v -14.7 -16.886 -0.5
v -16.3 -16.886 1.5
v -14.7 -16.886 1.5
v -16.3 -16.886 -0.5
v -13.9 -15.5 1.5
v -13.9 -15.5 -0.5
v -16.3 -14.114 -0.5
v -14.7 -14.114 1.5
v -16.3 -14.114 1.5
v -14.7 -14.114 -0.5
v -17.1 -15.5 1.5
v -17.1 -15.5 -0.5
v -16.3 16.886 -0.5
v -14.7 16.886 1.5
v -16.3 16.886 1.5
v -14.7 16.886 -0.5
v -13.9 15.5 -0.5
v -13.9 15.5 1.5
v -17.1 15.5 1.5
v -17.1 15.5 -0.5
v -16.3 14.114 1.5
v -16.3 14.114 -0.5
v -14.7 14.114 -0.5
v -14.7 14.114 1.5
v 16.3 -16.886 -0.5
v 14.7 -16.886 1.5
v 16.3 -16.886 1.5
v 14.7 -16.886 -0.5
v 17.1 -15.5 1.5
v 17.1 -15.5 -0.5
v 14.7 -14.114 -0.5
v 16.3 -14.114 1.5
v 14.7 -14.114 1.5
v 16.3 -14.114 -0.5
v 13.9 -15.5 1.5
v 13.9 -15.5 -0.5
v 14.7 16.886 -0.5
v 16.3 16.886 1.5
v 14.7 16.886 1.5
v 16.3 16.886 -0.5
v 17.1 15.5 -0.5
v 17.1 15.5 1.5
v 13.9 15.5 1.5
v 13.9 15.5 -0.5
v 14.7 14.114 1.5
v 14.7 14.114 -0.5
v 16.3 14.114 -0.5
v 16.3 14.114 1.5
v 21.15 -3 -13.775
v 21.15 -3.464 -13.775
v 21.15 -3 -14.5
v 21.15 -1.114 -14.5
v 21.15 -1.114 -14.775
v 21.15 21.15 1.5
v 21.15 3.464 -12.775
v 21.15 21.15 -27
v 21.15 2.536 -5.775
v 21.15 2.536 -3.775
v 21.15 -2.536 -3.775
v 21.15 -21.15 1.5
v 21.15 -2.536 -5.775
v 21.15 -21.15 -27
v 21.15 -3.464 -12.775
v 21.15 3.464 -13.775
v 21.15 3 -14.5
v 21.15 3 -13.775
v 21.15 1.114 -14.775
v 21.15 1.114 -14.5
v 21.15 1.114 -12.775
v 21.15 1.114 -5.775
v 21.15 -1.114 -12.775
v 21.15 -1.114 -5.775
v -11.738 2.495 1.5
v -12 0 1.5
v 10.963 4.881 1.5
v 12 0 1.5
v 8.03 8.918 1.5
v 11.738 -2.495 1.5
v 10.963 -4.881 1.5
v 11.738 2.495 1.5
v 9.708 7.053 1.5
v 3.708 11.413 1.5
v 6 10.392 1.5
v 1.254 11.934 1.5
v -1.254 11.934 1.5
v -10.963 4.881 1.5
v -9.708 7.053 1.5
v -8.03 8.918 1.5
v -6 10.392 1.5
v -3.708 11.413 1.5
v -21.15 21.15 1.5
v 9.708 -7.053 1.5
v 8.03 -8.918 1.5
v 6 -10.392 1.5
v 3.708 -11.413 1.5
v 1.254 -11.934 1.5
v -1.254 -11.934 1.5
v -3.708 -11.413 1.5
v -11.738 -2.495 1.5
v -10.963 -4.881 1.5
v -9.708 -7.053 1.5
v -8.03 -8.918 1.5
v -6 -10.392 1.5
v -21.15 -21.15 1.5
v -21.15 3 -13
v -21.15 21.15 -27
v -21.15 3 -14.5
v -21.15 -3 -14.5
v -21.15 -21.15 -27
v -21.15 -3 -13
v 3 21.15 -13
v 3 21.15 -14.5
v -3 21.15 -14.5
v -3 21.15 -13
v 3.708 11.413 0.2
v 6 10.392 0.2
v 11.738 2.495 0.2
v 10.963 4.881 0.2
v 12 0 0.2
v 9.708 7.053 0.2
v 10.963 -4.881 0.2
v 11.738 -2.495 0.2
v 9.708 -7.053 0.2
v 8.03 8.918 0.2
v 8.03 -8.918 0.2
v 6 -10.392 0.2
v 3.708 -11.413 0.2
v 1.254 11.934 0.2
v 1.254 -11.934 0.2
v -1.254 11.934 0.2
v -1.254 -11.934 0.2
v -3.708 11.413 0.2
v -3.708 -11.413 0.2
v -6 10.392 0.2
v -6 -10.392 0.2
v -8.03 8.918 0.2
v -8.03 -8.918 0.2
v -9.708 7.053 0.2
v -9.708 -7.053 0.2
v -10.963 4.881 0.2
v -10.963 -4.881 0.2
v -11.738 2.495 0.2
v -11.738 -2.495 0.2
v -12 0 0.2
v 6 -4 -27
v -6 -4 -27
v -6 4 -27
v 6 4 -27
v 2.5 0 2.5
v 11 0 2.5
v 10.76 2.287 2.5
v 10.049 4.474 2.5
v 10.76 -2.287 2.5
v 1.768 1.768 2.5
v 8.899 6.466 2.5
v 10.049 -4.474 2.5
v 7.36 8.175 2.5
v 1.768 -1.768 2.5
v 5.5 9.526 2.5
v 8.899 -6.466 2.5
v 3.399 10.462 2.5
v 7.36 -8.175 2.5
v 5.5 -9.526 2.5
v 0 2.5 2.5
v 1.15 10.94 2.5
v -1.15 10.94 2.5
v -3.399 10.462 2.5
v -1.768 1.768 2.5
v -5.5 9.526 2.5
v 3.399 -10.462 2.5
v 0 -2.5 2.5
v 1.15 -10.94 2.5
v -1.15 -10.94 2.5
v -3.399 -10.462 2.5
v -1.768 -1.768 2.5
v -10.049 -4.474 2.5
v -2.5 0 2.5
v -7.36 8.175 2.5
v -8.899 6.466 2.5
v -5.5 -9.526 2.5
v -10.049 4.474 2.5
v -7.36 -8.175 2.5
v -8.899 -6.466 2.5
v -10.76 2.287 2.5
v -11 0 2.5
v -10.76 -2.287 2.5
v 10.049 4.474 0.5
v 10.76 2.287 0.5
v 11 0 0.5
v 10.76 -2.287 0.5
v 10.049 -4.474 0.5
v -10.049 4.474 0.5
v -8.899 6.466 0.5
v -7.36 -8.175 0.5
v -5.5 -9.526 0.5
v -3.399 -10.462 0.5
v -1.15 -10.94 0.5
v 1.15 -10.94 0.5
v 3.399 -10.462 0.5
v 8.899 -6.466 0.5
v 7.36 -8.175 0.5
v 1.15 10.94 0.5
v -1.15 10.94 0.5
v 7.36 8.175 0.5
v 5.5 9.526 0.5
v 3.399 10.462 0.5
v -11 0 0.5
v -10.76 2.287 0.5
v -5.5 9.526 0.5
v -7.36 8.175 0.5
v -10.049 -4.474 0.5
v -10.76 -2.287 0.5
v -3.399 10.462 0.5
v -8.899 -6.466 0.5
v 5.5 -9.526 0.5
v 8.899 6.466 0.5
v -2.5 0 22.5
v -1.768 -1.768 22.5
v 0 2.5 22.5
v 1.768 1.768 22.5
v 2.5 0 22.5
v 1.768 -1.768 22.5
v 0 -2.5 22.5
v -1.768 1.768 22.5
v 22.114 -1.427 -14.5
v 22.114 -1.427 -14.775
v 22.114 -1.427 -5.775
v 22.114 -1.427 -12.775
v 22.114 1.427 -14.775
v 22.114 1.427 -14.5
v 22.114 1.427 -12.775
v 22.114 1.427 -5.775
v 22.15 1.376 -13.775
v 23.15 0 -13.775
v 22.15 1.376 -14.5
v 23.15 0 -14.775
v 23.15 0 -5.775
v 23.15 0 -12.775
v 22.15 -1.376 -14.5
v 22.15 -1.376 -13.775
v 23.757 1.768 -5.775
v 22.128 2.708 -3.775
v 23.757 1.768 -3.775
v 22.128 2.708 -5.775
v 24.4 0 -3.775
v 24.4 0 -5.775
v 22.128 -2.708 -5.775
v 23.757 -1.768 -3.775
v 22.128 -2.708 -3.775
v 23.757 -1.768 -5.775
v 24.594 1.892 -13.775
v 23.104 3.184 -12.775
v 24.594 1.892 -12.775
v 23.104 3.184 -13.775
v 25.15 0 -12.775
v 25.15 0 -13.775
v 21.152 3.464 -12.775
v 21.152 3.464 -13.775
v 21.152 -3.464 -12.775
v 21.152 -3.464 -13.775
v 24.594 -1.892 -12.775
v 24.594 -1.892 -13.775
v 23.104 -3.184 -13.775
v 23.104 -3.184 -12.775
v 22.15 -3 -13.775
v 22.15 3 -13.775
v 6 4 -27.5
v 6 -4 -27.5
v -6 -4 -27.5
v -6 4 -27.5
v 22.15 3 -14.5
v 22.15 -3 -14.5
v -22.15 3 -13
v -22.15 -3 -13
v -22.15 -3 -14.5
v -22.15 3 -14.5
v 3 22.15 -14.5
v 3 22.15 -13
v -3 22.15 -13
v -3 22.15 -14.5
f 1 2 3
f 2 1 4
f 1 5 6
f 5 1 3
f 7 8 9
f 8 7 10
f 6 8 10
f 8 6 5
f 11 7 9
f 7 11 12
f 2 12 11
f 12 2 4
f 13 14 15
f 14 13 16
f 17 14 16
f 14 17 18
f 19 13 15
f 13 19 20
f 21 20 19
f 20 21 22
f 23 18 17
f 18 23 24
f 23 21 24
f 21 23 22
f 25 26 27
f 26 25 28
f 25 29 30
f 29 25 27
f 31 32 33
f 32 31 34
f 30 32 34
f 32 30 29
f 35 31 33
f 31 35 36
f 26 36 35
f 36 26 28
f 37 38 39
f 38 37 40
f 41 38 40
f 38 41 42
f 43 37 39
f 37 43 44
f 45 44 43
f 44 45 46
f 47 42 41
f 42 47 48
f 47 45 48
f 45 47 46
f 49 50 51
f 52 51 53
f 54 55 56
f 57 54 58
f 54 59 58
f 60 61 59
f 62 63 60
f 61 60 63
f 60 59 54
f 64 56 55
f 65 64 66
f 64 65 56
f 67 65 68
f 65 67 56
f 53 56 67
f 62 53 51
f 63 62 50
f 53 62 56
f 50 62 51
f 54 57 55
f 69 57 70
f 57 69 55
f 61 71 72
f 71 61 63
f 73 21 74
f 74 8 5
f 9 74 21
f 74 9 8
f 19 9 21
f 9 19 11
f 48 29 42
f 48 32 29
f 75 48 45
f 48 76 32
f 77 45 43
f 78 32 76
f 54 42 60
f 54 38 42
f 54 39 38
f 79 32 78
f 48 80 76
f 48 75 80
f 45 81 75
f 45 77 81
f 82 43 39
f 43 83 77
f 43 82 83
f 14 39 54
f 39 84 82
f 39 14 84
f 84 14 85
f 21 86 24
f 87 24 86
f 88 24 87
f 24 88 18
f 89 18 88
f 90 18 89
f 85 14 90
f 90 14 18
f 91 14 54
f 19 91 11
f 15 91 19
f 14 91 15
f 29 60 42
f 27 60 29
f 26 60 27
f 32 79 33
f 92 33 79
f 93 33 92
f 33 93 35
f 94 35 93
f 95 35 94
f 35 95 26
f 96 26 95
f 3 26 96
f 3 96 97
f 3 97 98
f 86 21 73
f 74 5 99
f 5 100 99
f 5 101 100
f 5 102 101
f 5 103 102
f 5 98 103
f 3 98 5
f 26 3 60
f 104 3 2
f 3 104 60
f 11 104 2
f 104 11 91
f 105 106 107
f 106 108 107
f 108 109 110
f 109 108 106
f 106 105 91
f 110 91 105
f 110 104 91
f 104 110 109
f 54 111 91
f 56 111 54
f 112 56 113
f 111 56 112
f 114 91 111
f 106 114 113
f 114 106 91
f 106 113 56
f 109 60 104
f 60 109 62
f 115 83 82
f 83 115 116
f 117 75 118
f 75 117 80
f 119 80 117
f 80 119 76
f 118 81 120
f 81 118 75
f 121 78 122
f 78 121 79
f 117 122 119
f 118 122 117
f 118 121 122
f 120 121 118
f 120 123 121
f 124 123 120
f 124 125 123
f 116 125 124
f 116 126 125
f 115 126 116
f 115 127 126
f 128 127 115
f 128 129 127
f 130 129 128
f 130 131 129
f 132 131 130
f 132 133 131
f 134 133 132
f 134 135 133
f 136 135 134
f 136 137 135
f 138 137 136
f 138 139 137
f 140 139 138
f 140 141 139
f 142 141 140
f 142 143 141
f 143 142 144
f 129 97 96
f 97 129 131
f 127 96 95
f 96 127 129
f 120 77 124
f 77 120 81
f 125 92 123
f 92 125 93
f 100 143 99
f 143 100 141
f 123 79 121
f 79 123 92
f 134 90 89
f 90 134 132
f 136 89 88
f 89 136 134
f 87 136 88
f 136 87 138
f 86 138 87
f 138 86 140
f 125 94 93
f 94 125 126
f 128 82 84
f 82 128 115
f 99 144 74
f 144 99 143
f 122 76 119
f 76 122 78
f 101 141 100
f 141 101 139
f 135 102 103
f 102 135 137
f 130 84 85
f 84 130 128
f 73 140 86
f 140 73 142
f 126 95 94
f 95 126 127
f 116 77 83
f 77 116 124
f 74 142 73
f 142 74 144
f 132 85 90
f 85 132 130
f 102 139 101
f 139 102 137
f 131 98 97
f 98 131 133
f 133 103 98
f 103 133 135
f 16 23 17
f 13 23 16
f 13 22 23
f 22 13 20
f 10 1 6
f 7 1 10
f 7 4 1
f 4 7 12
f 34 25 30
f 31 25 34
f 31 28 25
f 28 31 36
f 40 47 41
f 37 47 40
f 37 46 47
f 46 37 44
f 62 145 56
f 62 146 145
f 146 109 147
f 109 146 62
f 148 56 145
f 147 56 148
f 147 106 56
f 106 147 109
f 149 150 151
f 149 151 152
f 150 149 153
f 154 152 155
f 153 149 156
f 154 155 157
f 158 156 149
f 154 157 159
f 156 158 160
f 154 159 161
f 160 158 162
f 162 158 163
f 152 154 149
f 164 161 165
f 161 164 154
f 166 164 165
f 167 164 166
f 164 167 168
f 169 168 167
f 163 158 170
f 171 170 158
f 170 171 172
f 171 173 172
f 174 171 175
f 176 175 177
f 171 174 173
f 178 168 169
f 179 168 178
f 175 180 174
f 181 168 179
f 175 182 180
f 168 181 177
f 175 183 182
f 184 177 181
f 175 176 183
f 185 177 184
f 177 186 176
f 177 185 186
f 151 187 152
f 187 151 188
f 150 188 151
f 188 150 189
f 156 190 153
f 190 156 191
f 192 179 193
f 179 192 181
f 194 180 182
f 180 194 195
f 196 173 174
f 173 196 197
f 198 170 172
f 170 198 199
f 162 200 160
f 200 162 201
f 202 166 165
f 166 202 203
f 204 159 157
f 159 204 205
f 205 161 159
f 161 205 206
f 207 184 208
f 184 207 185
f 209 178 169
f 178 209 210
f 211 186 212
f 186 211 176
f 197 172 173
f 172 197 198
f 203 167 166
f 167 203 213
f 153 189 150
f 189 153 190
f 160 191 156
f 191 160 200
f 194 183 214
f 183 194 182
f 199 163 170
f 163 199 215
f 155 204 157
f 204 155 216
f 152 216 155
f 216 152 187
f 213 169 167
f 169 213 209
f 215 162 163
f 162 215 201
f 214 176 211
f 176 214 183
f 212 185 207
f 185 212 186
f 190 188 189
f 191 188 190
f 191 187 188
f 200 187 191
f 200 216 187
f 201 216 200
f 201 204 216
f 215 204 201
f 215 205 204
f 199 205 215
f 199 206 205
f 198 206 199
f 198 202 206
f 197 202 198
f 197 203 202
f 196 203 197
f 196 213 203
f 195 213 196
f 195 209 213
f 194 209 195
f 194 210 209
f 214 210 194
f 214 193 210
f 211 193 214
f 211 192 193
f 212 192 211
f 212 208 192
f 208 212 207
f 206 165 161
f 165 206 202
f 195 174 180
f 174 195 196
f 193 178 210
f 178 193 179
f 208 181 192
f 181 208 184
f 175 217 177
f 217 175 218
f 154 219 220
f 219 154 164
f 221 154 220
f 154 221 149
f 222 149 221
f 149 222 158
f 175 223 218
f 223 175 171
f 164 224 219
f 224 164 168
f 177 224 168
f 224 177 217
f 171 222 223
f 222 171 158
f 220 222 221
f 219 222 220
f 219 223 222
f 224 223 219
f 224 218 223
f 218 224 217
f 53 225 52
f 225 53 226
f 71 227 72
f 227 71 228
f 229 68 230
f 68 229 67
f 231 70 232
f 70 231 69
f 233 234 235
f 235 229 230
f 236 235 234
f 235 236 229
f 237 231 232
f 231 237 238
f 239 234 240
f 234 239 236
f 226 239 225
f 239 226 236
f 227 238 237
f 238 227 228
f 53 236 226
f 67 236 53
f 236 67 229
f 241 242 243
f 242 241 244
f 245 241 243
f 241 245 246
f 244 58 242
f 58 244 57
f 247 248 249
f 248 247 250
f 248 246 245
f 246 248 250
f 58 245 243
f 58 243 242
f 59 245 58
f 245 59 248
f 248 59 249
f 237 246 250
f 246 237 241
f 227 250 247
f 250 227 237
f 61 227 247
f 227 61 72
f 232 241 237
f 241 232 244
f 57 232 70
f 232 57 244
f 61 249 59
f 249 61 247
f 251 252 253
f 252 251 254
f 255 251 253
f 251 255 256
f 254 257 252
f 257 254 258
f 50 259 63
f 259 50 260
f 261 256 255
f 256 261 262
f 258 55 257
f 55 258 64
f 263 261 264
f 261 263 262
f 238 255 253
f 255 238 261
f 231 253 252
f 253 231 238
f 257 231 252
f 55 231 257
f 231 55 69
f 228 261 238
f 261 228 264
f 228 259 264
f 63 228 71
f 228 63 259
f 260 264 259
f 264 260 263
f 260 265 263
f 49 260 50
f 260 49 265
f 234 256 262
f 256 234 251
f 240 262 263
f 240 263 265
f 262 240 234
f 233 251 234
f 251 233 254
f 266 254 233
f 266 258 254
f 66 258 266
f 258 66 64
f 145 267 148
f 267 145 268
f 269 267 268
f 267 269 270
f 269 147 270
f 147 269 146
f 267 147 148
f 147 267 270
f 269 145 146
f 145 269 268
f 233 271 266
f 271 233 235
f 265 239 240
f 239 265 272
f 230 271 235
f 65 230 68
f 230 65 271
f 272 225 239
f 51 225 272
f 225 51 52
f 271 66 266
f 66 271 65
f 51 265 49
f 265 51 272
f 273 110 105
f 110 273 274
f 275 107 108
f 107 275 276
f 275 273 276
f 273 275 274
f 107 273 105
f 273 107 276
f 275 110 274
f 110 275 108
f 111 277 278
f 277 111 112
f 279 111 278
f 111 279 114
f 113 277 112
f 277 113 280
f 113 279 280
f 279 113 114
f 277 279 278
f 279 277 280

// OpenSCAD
// Parameters
face_width = 42.3; //[21.15:84.6:0.1]
face_thickness = 3.0; //[1.5:6.0:0.1]
body_length = 26.5; //[13.25:53.0:0.1]
body_width = 42.3; //[21.15:84.6:0.1]
body_height = 42.3; //[21.15:84.6:0.1]
shaft_diameter = 5.0; //[2.5:10.0:0.1]
shaft_length = 20.0; //[10.0:40.0:0.1]
mounting_hole_spacing = 31.0; //[15.5:62.0:0.1]
mounting_hole_diameter = 3.2; //[1.6:6.4:0.1]
shaft_boss_diameter = 22.0; //[11.0:44.0:0.1]
shaft_boss_height = 2.0; //[1.0:4.0:0.1]
front_face_recess_diameter = 24.0; //[12.0:48.0:0.1]
front_face_recess_depth = 0.8; //[0.0:2.0:0.1]
overlap = 1.0; //[0.5:2.0:0.1]
pattern_stub_size = 6.0; //[3.0:12.0:0.1]
pattern_stub_depth = 1.5; //[0.8:3.0:0.1]
d_plug_length = 12.0; //[6.0:24.0:0.1]
d_plug_width = 8.0; //[4.0:16.0:0.1]
d_plug_rad = 1.5; //[0.8:3.0:0.1]
screw_shank_diameter = 3.0; //[1.5:6.0:0.1]
screw_length = 10.0; //[5.0:20.0:0.1]
screw_head_diameter = 5.5; //[2.75:11.0:0.1]
screw_head_height = 2.0; //[1.0:4.0:0.1]
washer_outer_diameter = 7.0; //[3.5:14.0:0.1]
washer_thickness = 1.0; //[0.5:2.0:0.1]

// ---------- Derived Z reference planes (centered at origin) ----------
z_face_center = 0;
z_face_front  = z_face_center + face_thickness/2;
z_face_back   = z_face_center - face_thickness/2;

z_body_center = z_face_back - body_length/2 + overlap; // slight overlap into face
z_body_front  = z_body_center + body_length/2;
z_body_back   = z_body_center - body_length/2;

// ---------- Modules for detailed components ----------
module d_plug_D() {
  // Attach to BACK of motor body (not floating)
  // Ensure it intersects the body by 'overlap'
  color("DimGray")
    translate([
      0,
      0,
      z_body_back - pattern_stub_depth/2 + overlap
    ])
      cube([d_plug_length, d_plug_width, pattern_stub_depth], center=true);
}

module grill_hole_positions() {
  // Cosmetic stub on RIGHT side, attached to body
  color("Silver")
    translate([
      body_width/2 - pattern_stub_size/2 + overlap, // push into body by overlap
      0,
      z_body_center
    ])
      cube([pattern_stub_size, pattern_stub_size, pattern_stub_depth], center=true);
}

module ttrack_hole_positions() {
  // Cosmetic stub on LEFT side, attached to body
  color("Silver")
    translate([
      -(body_width/2 - pattern_stub_size/2 + overlap), // push into body by overlap
      0,
      z_body_center
    ])
      cube([pattern_stub_size, pattern_stub_size, pattern_stub_depth], center=true);
}

module rail_hole_positions() {
  // Cosmetic stub on TOP side, attached to body
  color("Silver")
    translate([
      0,
      body_height/2 - pattern_stub_size/2 + overlap, // push into body by overlap
      z_body_center
    ])
      cube([pattern_stub_size, pattern_stub_size, pattern_stub_depth], center=true);
}

module screw_and_washer() {
  // The "small gray cylindrical/bolt-like part on the side" was floating.
  // Fix: place it on the RIGHT side of the motor body and ensure overlap into the body.
  // Keep the same general look (vertical screw with head + washer).
  color("Silver") {
    // Choose a Z location near the top of the body (as in the screenshots),
    // but still on the body (not on the front face).
    z_screw = z_body_center + body_length*0.15;

    // Place screw axis just outside the right face, then pull it into the body by overlap.
    x_screw = body_width/2 + screw_shank_diameter/2 - overlap;

    // Shank (vertical along Z)
    translate([x_screw, 0, z_screw])
      cylinder(r=screw_shank_diameter/2, h=screw_length, center=true);

    // Head on the +Z end of shank
    translate([x_screw, 0, z_screw + screw_length/2 + screw_head_height/2 - overlap])
      cylinder(r=screw_head_diameter/2, h=screw_head_height, center=true);

    // Washer near the -Z end of shank
    translate([x_screw, 0, z_screw - screw_length/2 + washer_thickness/2 + overlap])
      cylinder(r=washer_outer_diameter/2, h=washer_thickness, center=true);
  }
}

// ---------- Main assembly ----------
module assembly() {
  union() {

    // Main motor solids (black)
    color("Black") union() {

      // Motor body
      translate([0, 0, z_body_center])
        cube([body_width, body_height, body_length], center=true);

      // Front face with recess and mounting holes
      difference() {
        translate([0, 0, z_face_center])
          cube([face_width, face_width, face_thickness], center=true);

        // Recess
        translate([0, 0, z_face_front - front_face_recess_depth/2])
          cylinder(r=front_face_recess_diameter/2,
                   h=front_face_recess_depth + overlap,
                   center=true);

        // Mounting holes
        for (x = [-1, 1], y = [-1, 1]) {
          translate([x * mounting_hole_spacing/2, y * mounting_hole_spacing/2, z_face_center])
            cylinder(r=mounting_hole_diameter/2,
                     h=face_thickness + overlap*2,
                     center=true);
        }
      }

      // Shaft center boss (overlaps into face)
      translate([0, 0, z_face_front + shaft_boss_height/2 - overlap])
        cylinder(r=shaft_boss_diameter/2, h=shaft_boss_height, center=true);

      // Output shaft (overlaps into boss)
      translate([0, 0, z_face_front + shaft_boss_height - overlap + shaft_length/2])
        cylinder(r=shaft_diameter/2, h=shaft_length, center=true);
    }

    // Secondary components (all unioned so nothing floats)
    d_plug_D();
    grill_hole_positions();
    ttrack_hole_positions();
    rail_hole_positions();
    screw_and_washer();
  }
}

assembly();
